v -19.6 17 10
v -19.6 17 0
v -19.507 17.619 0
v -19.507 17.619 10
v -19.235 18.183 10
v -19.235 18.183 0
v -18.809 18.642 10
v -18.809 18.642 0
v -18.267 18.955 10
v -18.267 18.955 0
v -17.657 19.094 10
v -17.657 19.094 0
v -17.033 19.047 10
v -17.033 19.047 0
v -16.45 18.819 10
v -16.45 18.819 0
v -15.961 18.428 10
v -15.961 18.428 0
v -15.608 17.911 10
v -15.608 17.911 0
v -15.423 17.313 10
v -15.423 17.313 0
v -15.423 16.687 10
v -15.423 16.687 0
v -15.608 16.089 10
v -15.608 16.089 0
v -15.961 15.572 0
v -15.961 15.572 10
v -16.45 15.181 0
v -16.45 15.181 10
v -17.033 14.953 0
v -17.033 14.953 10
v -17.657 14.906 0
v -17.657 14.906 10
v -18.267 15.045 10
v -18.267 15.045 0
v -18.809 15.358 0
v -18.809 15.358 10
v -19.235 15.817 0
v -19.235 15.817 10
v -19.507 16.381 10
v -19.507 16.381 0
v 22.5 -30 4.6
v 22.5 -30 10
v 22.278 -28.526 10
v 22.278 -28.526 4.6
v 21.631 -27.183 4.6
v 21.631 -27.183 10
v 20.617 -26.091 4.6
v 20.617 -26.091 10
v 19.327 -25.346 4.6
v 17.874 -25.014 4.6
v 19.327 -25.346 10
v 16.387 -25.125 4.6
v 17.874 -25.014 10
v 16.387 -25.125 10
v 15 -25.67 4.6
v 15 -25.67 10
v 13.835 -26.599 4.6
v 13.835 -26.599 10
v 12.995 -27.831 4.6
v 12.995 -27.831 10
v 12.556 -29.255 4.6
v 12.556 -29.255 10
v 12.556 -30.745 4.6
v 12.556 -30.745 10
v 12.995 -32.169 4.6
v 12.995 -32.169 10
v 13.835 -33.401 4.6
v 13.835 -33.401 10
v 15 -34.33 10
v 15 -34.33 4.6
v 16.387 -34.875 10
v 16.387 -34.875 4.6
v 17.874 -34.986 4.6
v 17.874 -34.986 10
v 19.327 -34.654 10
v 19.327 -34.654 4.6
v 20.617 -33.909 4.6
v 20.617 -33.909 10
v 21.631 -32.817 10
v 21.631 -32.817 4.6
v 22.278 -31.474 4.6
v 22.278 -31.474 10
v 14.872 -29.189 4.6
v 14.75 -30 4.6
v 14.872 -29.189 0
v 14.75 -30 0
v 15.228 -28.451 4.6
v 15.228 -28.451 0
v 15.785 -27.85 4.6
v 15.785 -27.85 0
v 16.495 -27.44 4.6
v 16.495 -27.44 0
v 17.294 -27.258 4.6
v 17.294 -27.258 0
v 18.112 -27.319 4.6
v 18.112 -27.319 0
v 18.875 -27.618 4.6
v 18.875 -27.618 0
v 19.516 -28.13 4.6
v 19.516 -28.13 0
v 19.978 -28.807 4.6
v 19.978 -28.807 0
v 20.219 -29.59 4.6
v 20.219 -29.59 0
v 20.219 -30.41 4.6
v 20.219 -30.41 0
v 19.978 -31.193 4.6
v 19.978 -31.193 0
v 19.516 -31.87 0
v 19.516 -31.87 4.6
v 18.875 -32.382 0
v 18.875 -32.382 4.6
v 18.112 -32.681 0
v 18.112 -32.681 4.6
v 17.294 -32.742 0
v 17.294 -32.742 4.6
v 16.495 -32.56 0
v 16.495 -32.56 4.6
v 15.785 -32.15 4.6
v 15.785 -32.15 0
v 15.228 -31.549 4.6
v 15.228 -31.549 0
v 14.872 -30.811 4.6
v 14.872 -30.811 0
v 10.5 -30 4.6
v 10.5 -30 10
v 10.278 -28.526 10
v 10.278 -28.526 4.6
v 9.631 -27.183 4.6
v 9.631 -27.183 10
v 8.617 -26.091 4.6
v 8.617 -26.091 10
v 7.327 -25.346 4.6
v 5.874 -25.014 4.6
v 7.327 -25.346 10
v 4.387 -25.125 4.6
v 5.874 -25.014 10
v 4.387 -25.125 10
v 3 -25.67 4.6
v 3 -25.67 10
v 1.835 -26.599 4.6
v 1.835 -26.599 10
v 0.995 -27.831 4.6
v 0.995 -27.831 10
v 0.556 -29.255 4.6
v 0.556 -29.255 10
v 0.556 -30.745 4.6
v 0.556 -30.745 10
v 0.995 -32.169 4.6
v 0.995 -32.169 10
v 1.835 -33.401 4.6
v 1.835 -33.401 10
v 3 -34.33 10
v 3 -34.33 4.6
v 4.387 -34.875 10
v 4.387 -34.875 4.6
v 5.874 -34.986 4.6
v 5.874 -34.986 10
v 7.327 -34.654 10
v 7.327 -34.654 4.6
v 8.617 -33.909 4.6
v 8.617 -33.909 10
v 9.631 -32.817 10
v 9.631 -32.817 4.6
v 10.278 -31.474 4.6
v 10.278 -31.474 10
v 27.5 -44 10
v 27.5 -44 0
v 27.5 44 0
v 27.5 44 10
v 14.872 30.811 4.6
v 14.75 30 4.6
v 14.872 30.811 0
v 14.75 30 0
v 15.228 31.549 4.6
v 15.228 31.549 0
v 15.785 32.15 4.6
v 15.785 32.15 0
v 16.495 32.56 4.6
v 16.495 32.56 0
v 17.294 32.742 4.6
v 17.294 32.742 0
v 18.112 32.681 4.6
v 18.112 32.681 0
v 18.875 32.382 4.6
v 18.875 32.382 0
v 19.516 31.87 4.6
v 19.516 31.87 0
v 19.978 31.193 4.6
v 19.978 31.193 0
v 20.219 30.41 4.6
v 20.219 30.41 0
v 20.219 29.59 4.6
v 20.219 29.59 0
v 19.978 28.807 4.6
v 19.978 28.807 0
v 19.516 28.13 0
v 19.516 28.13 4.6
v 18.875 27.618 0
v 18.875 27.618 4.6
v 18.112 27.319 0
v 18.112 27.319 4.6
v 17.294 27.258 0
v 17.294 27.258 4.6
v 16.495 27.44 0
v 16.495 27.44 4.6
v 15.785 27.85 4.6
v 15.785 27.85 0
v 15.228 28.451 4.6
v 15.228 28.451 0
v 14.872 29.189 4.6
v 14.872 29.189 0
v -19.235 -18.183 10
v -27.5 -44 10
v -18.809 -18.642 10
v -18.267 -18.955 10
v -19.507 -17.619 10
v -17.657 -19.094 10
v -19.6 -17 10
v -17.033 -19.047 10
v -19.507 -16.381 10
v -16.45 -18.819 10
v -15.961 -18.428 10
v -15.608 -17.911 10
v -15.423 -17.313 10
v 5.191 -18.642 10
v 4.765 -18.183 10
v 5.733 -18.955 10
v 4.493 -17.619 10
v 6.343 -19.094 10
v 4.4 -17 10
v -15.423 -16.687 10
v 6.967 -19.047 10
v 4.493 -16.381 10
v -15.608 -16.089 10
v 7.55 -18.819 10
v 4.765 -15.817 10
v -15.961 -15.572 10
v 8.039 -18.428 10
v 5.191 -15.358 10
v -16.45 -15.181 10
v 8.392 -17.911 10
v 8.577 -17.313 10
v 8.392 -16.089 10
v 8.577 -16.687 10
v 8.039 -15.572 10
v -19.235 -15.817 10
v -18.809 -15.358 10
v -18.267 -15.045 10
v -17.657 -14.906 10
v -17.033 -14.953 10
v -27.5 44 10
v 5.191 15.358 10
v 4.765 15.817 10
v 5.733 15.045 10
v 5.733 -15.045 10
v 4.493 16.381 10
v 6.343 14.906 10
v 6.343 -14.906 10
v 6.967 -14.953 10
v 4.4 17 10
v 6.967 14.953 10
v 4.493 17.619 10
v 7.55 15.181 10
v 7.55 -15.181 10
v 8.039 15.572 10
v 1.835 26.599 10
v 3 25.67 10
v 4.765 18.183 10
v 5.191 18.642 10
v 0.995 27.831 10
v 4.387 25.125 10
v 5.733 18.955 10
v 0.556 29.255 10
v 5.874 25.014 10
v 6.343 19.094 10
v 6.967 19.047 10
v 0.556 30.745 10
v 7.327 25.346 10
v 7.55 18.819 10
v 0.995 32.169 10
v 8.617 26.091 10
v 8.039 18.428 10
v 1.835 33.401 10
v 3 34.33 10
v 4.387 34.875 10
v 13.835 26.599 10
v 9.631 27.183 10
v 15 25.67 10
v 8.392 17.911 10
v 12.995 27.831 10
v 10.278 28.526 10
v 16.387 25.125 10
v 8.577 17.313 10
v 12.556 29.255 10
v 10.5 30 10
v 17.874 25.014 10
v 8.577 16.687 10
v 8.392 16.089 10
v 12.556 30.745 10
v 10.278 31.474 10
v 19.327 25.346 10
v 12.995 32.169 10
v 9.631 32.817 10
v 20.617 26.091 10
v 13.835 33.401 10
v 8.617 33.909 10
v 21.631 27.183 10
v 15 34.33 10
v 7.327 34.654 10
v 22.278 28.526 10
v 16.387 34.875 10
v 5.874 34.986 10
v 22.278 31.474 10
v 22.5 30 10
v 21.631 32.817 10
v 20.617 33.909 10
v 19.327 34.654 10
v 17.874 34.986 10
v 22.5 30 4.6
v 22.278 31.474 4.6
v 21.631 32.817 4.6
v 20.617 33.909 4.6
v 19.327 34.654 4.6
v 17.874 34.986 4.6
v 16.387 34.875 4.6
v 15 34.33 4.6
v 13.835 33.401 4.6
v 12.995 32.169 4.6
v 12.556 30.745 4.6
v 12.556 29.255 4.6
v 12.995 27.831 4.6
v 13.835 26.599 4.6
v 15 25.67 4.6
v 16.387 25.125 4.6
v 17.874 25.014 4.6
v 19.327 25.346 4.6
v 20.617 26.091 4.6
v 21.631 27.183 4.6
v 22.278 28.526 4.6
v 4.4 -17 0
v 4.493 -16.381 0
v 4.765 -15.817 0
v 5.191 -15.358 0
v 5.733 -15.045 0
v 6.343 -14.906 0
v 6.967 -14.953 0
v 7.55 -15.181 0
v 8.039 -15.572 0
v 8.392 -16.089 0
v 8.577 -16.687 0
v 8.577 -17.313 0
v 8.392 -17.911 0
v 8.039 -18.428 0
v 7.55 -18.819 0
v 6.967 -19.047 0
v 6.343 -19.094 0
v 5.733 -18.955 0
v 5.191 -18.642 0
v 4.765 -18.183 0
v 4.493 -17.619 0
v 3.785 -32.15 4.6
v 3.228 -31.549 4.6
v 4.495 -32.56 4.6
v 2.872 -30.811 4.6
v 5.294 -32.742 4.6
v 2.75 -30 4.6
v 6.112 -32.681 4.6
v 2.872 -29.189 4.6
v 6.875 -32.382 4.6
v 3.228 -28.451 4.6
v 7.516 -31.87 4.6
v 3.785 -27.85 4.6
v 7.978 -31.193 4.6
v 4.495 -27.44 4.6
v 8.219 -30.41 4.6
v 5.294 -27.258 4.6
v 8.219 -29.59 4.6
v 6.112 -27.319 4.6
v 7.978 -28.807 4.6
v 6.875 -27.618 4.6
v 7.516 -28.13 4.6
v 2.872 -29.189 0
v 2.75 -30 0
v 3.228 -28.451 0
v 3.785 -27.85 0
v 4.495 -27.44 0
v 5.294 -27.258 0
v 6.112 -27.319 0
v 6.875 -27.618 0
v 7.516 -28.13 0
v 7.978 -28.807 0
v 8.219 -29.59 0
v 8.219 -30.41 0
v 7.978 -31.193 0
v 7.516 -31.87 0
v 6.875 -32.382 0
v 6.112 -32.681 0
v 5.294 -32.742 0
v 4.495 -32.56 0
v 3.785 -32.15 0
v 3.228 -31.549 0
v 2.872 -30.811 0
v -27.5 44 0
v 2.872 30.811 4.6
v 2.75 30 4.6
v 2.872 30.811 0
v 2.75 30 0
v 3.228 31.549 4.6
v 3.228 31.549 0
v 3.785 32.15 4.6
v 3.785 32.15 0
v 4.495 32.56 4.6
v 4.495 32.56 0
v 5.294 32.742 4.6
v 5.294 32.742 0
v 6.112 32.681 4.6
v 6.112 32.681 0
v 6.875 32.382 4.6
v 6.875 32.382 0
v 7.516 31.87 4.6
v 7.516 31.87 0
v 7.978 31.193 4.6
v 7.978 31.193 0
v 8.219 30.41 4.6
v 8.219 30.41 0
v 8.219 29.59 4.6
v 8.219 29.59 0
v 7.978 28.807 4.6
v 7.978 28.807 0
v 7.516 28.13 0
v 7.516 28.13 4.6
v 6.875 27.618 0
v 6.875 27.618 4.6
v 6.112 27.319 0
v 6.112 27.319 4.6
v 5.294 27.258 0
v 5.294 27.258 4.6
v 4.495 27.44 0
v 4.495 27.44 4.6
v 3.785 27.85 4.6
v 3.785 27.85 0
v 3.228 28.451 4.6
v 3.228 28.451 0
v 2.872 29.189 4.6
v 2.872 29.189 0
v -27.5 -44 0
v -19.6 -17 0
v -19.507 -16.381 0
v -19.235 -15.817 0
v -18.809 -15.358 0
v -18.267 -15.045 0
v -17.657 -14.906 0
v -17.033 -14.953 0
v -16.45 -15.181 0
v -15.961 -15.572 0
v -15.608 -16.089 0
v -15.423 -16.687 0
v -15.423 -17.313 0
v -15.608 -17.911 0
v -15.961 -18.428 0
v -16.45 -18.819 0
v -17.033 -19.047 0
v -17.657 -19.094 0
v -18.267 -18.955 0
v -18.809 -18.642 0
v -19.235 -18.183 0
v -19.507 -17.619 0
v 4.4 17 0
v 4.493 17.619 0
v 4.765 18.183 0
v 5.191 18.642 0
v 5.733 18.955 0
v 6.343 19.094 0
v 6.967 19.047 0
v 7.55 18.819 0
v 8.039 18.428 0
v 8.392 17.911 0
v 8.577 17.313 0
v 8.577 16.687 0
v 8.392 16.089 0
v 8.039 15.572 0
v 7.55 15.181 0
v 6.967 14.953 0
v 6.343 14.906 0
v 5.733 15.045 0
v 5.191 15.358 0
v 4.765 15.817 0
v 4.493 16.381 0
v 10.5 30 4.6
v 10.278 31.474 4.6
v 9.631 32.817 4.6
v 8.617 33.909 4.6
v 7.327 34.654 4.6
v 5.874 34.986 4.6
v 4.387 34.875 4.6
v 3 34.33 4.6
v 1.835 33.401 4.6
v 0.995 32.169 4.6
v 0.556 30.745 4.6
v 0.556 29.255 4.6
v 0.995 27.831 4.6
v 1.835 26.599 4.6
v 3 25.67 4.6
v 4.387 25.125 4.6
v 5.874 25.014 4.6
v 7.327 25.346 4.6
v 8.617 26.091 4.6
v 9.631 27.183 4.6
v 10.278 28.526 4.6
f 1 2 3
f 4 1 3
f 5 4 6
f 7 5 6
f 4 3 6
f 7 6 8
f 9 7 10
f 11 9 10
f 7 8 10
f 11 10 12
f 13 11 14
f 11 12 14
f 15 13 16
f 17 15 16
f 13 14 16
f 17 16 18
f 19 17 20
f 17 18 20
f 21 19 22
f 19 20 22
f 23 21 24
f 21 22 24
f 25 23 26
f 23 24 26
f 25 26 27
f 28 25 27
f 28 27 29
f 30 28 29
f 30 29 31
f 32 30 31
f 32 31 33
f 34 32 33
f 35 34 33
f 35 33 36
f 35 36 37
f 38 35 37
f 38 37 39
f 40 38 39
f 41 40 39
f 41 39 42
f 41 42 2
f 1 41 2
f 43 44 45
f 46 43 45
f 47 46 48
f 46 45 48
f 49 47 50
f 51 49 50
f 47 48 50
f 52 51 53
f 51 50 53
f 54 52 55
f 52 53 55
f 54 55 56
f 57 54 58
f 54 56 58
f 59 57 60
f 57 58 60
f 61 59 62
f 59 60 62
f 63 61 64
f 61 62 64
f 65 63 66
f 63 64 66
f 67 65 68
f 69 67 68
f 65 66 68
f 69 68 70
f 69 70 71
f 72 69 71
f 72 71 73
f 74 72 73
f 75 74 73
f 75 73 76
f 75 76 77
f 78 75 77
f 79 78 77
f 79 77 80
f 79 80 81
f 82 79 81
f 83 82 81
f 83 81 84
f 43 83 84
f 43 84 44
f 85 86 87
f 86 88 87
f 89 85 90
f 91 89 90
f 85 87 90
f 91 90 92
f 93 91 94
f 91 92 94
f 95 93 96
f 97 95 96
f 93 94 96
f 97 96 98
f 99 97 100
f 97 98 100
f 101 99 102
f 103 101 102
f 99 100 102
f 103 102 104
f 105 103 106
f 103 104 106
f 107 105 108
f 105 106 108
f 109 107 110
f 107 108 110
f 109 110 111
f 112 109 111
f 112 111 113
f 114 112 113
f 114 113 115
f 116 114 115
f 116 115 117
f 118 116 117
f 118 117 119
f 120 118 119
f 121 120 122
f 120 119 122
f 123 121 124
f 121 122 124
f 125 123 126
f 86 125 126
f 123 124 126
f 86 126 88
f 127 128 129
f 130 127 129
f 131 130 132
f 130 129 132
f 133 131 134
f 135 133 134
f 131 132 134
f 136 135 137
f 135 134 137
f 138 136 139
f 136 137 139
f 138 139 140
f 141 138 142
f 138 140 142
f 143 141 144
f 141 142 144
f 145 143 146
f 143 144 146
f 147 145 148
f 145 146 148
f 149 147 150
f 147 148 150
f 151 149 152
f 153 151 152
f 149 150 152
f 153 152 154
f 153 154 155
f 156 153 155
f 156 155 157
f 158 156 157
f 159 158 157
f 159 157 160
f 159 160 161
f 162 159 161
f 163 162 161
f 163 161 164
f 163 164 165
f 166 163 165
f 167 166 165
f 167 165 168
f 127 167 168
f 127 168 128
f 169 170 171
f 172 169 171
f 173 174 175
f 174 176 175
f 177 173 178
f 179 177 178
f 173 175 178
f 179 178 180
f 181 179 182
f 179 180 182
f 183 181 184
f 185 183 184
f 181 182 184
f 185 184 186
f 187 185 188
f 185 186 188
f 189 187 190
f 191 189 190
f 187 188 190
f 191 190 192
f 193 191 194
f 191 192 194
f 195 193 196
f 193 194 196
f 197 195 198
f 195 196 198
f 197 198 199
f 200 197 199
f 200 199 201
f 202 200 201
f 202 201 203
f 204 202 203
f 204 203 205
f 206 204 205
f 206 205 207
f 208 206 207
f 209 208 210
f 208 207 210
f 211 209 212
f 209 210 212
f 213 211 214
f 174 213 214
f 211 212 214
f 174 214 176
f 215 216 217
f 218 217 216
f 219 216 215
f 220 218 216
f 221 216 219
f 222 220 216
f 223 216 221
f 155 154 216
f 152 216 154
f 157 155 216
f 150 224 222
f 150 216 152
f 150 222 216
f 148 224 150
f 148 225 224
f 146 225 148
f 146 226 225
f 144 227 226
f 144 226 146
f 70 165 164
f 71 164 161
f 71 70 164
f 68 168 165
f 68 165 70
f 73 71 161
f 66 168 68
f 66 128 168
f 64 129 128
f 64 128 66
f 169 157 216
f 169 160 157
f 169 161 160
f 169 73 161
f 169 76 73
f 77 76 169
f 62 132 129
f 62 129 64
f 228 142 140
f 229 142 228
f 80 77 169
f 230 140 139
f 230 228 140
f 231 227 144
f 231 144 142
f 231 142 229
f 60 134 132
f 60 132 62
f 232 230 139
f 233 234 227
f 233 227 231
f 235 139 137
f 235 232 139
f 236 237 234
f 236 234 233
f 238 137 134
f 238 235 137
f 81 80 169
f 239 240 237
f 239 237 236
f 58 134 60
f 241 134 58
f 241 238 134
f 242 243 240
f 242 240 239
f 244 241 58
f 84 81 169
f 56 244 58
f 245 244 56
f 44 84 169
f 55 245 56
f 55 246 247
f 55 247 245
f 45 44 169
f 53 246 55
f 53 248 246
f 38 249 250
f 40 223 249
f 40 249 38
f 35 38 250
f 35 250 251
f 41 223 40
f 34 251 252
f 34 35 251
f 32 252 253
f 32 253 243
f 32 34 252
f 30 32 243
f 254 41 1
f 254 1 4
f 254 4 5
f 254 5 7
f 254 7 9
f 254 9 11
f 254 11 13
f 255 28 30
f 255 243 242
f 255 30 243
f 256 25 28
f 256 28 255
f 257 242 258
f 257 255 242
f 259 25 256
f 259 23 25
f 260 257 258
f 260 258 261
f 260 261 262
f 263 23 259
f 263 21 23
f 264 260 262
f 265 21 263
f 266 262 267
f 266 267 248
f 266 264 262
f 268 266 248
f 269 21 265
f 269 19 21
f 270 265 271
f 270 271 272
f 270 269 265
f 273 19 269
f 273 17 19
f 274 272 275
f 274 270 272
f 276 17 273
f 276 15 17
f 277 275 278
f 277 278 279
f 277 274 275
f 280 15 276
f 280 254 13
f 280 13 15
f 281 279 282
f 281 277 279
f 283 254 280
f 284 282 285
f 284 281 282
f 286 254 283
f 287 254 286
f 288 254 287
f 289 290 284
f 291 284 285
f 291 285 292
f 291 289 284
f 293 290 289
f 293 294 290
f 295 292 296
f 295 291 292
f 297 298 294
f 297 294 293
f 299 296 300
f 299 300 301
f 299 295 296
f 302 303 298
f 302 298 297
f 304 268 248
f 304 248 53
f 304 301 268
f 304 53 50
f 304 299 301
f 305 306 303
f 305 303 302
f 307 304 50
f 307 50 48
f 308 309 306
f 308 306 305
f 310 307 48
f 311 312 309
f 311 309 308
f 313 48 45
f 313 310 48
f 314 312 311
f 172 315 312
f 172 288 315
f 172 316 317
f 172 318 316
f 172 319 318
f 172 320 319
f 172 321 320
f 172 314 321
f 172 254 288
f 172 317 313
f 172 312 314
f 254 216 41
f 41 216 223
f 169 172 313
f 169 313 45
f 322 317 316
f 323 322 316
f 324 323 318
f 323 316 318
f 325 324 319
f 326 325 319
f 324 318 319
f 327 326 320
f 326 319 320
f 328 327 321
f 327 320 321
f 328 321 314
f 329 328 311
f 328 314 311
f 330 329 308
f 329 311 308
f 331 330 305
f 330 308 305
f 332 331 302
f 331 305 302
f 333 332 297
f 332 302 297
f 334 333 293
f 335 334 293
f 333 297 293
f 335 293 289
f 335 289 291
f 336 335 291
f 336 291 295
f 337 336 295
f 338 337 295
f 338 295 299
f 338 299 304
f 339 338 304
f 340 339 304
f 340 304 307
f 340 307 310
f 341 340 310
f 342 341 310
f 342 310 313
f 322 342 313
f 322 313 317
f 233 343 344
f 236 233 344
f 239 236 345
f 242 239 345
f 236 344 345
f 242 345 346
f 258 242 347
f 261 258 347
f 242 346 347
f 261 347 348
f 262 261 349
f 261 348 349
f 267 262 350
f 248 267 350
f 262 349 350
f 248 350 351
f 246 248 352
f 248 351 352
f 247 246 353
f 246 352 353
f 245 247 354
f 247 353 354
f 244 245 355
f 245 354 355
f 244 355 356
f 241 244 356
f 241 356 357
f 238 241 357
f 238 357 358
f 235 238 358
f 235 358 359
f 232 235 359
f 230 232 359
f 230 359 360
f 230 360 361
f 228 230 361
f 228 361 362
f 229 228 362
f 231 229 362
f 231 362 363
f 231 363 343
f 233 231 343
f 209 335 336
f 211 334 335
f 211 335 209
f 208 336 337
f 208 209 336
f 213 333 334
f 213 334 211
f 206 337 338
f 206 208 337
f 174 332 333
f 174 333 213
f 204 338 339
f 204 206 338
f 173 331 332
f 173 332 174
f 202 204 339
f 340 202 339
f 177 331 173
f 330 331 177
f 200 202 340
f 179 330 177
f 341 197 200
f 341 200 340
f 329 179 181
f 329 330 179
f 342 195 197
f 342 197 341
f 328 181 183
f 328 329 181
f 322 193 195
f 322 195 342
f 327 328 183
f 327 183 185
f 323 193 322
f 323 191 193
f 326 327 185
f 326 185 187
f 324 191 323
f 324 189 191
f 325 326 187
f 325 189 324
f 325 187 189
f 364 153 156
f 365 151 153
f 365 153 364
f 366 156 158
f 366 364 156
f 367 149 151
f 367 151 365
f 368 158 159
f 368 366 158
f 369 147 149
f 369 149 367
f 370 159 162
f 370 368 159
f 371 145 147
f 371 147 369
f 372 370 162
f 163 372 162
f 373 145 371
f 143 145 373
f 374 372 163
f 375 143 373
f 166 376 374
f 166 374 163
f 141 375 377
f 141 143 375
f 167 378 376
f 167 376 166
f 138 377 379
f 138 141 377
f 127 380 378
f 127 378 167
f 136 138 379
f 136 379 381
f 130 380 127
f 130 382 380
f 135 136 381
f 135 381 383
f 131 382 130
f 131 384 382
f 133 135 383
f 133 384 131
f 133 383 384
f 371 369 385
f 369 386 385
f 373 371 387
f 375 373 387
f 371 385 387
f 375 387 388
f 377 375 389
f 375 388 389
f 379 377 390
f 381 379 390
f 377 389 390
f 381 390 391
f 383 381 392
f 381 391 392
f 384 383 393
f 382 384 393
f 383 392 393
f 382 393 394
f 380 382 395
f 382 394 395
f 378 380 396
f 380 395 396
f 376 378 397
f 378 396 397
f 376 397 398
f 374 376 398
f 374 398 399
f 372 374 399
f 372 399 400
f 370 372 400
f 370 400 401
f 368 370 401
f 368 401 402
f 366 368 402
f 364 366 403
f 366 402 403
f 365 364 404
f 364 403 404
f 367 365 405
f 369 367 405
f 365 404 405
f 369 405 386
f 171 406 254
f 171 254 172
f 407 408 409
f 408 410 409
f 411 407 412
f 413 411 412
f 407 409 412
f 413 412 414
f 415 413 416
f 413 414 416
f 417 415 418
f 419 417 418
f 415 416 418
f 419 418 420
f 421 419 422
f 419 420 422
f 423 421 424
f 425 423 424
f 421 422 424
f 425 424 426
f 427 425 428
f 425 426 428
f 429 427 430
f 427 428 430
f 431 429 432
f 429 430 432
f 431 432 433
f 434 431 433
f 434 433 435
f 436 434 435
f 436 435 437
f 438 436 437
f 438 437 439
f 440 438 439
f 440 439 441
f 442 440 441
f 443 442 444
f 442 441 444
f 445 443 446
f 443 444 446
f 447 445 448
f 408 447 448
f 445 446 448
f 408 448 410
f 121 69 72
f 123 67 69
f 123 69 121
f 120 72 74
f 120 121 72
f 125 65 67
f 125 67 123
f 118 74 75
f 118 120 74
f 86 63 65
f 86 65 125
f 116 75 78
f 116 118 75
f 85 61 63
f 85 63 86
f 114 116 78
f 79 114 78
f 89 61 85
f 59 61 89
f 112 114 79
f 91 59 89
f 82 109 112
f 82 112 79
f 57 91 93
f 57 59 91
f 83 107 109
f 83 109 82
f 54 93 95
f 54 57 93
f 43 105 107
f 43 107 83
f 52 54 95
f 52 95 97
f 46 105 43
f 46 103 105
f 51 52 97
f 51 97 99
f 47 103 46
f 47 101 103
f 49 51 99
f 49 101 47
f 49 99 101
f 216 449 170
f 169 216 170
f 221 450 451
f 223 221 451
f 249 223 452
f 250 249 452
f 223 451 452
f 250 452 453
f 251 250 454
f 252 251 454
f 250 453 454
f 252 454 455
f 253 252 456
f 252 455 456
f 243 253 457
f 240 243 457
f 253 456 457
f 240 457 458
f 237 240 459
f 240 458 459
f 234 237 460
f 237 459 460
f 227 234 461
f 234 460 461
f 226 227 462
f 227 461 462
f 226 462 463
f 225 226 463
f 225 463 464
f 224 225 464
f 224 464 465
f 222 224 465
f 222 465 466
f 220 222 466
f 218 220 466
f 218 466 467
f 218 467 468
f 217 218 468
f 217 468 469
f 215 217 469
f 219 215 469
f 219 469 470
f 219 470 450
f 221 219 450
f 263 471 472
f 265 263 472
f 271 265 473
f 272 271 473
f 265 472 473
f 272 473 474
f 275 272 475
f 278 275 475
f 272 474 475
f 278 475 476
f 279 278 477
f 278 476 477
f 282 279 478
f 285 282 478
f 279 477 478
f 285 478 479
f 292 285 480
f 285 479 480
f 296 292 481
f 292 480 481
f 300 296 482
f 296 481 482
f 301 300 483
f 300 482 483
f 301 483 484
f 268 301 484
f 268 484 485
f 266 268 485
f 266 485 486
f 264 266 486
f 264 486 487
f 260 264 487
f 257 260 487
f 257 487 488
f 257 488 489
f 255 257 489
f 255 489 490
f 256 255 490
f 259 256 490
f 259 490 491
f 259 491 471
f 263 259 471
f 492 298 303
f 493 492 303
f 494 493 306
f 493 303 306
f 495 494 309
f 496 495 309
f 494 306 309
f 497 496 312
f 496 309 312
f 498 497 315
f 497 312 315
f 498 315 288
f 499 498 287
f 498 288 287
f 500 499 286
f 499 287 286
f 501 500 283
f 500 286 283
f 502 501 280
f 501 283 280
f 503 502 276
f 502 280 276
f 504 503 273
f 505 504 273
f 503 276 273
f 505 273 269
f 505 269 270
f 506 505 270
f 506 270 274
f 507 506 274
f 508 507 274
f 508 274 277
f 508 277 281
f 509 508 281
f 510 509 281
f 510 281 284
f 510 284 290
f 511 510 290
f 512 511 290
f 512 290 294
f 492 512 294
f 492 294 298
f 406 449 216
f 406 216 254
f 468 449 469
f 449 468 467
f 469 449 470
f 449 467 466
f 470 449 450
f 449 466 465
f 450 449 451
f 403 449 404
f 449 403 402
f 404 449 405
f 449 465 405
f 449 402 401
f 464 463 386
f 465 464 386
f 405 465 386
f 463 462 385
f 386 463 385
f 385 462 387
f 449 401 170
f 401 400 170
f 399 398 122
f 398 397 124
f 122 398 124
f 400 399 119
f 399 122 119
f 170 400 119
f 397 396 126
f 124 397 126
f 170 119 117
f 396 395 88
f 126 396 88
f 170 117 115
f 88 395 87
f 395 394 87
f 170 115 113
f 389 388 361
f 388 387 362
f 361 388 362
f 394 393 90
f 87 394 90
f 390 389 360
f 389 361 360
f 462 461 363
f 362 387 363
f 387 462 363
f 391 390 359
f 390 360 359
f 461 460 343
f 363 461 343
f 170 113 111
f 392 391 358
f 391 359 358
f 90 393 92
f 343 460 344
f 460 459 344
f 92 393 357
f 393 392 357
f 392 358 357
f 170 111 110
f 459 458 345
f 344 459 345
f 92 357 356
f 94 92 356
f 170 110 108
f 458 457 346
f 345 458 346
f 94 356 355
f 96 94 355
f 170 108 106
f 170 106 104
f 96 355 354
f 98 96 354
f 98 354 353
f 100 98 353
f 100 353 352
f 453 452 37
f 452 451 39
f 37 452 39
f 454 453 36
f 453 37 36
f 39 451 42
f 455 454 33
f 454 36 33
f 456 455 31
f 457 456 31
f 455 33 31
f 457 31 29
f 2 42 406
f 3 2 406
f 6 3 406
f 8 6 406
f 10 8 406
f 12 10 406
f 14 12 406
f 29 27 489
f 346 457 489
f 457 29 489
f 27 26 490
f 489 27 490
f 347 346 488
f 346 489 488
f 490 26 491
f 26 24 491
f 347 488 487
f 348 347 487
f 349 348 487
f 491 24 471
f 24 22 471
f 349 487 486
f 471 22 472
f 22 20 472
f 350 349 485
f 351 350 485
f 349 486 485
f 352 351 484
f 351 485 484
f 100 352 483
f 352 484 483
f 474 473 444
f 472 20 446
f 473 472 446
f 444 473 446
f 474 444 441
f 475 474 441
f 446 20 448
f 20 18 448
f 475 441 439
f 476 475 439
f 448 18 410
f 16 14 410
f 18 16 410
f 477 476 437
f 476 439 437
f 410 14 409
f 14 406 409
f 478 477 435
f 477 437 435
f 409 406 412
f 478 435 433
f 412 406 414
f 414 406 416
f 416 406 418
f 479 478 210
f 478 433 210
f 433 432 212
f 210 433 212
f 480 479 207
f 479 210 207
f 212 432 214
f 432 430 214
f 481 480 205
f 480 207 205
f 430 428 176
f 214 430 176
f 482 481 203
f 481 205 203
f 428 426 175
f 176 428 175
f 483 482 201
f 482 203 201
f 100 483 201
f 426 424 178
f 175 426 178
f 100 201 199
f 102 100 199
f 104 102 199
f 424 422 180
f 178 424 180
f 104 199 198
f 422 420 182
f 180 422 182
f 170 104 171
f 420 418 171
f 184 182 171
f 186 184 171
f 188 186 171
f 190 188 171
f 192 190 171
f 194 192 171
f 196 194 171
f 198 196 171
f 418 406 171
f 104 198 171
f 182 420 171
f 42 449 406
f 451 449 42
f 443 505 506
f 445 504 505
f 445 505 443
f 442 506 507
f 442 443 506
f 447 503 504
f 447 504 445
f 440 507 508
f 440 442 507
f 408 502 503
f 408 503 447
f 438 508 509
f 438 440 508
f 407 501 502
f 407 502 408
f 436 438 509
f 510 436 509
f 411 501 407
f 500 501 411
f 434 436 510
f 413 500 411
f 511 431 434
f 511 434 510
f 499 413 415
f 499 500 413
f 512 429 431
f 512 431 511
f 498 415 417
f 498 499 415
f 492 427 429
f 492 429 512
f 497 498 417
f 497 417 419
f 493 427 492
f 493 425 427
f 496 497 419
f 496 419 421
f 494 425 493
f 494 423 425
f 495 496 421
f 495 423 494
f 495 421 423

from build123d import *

# Parameters (mm, degrees)
SKETCH1_W                                           = 55
SKETCH1_H                                           = 88
BOSS_EXTRUDE1_DEPTH                                 = 10
M5_TAPPED_HOLE1_D                                   = 4.2
CBORE_FOR_M5_HEX_SOCKET_HEAD_CAP_SCREW1_D           = 5.5
CBORE_FOR_M5_HEX_SOCKET_HEAD_CAP_SCREW1_CBORE_D     = 10
CBORE_FOR_M5_HEX_SOCKET_HEAD_CAP_SCREW1_CBORE_DEPTH = 5.4


with BuildPart() as part:
    # Sketch1 → Boss-Extrude1 (new body)
    with BuildSketch(Plane.XY):
        Rectangle(SKETCH1_W, SKETCH1_H)
    extrude(amount=BOSS_EXTRUDE1_DEPTH)

    # M5 Tapped Hole1 (through all)
    with Locations(Plane.XY.offset(10)):
        with Locations((-17.5, 17), (6.5, 17), (-17.5, -17), (6.5, -17)):
            Hole(M5_TAPPED_HOLE1_D / 2)

    # CBORE for M5 Hex Socket Head Cap Screw1 (through all)
    with Locations(Plane.XY.offset(10)):
        with Locations((5.5, 30), (17.5, 30), (17.5, -30), (5.5, -30)):
            CounterBoreHole(CBORE_FOR_M5_HEX_SOCKET_HEAD_CAP_SCREW1_D / 2, CBORE_FOR_M5_HEX_SOCKET_HEAD_CAP_SCREW1_CBORE_D / 2, CBORE_FOR_M5_HEX_SOCKET_HEAD_CAP_SCREW1_CBORE_DEPTH)


solid = part.part
